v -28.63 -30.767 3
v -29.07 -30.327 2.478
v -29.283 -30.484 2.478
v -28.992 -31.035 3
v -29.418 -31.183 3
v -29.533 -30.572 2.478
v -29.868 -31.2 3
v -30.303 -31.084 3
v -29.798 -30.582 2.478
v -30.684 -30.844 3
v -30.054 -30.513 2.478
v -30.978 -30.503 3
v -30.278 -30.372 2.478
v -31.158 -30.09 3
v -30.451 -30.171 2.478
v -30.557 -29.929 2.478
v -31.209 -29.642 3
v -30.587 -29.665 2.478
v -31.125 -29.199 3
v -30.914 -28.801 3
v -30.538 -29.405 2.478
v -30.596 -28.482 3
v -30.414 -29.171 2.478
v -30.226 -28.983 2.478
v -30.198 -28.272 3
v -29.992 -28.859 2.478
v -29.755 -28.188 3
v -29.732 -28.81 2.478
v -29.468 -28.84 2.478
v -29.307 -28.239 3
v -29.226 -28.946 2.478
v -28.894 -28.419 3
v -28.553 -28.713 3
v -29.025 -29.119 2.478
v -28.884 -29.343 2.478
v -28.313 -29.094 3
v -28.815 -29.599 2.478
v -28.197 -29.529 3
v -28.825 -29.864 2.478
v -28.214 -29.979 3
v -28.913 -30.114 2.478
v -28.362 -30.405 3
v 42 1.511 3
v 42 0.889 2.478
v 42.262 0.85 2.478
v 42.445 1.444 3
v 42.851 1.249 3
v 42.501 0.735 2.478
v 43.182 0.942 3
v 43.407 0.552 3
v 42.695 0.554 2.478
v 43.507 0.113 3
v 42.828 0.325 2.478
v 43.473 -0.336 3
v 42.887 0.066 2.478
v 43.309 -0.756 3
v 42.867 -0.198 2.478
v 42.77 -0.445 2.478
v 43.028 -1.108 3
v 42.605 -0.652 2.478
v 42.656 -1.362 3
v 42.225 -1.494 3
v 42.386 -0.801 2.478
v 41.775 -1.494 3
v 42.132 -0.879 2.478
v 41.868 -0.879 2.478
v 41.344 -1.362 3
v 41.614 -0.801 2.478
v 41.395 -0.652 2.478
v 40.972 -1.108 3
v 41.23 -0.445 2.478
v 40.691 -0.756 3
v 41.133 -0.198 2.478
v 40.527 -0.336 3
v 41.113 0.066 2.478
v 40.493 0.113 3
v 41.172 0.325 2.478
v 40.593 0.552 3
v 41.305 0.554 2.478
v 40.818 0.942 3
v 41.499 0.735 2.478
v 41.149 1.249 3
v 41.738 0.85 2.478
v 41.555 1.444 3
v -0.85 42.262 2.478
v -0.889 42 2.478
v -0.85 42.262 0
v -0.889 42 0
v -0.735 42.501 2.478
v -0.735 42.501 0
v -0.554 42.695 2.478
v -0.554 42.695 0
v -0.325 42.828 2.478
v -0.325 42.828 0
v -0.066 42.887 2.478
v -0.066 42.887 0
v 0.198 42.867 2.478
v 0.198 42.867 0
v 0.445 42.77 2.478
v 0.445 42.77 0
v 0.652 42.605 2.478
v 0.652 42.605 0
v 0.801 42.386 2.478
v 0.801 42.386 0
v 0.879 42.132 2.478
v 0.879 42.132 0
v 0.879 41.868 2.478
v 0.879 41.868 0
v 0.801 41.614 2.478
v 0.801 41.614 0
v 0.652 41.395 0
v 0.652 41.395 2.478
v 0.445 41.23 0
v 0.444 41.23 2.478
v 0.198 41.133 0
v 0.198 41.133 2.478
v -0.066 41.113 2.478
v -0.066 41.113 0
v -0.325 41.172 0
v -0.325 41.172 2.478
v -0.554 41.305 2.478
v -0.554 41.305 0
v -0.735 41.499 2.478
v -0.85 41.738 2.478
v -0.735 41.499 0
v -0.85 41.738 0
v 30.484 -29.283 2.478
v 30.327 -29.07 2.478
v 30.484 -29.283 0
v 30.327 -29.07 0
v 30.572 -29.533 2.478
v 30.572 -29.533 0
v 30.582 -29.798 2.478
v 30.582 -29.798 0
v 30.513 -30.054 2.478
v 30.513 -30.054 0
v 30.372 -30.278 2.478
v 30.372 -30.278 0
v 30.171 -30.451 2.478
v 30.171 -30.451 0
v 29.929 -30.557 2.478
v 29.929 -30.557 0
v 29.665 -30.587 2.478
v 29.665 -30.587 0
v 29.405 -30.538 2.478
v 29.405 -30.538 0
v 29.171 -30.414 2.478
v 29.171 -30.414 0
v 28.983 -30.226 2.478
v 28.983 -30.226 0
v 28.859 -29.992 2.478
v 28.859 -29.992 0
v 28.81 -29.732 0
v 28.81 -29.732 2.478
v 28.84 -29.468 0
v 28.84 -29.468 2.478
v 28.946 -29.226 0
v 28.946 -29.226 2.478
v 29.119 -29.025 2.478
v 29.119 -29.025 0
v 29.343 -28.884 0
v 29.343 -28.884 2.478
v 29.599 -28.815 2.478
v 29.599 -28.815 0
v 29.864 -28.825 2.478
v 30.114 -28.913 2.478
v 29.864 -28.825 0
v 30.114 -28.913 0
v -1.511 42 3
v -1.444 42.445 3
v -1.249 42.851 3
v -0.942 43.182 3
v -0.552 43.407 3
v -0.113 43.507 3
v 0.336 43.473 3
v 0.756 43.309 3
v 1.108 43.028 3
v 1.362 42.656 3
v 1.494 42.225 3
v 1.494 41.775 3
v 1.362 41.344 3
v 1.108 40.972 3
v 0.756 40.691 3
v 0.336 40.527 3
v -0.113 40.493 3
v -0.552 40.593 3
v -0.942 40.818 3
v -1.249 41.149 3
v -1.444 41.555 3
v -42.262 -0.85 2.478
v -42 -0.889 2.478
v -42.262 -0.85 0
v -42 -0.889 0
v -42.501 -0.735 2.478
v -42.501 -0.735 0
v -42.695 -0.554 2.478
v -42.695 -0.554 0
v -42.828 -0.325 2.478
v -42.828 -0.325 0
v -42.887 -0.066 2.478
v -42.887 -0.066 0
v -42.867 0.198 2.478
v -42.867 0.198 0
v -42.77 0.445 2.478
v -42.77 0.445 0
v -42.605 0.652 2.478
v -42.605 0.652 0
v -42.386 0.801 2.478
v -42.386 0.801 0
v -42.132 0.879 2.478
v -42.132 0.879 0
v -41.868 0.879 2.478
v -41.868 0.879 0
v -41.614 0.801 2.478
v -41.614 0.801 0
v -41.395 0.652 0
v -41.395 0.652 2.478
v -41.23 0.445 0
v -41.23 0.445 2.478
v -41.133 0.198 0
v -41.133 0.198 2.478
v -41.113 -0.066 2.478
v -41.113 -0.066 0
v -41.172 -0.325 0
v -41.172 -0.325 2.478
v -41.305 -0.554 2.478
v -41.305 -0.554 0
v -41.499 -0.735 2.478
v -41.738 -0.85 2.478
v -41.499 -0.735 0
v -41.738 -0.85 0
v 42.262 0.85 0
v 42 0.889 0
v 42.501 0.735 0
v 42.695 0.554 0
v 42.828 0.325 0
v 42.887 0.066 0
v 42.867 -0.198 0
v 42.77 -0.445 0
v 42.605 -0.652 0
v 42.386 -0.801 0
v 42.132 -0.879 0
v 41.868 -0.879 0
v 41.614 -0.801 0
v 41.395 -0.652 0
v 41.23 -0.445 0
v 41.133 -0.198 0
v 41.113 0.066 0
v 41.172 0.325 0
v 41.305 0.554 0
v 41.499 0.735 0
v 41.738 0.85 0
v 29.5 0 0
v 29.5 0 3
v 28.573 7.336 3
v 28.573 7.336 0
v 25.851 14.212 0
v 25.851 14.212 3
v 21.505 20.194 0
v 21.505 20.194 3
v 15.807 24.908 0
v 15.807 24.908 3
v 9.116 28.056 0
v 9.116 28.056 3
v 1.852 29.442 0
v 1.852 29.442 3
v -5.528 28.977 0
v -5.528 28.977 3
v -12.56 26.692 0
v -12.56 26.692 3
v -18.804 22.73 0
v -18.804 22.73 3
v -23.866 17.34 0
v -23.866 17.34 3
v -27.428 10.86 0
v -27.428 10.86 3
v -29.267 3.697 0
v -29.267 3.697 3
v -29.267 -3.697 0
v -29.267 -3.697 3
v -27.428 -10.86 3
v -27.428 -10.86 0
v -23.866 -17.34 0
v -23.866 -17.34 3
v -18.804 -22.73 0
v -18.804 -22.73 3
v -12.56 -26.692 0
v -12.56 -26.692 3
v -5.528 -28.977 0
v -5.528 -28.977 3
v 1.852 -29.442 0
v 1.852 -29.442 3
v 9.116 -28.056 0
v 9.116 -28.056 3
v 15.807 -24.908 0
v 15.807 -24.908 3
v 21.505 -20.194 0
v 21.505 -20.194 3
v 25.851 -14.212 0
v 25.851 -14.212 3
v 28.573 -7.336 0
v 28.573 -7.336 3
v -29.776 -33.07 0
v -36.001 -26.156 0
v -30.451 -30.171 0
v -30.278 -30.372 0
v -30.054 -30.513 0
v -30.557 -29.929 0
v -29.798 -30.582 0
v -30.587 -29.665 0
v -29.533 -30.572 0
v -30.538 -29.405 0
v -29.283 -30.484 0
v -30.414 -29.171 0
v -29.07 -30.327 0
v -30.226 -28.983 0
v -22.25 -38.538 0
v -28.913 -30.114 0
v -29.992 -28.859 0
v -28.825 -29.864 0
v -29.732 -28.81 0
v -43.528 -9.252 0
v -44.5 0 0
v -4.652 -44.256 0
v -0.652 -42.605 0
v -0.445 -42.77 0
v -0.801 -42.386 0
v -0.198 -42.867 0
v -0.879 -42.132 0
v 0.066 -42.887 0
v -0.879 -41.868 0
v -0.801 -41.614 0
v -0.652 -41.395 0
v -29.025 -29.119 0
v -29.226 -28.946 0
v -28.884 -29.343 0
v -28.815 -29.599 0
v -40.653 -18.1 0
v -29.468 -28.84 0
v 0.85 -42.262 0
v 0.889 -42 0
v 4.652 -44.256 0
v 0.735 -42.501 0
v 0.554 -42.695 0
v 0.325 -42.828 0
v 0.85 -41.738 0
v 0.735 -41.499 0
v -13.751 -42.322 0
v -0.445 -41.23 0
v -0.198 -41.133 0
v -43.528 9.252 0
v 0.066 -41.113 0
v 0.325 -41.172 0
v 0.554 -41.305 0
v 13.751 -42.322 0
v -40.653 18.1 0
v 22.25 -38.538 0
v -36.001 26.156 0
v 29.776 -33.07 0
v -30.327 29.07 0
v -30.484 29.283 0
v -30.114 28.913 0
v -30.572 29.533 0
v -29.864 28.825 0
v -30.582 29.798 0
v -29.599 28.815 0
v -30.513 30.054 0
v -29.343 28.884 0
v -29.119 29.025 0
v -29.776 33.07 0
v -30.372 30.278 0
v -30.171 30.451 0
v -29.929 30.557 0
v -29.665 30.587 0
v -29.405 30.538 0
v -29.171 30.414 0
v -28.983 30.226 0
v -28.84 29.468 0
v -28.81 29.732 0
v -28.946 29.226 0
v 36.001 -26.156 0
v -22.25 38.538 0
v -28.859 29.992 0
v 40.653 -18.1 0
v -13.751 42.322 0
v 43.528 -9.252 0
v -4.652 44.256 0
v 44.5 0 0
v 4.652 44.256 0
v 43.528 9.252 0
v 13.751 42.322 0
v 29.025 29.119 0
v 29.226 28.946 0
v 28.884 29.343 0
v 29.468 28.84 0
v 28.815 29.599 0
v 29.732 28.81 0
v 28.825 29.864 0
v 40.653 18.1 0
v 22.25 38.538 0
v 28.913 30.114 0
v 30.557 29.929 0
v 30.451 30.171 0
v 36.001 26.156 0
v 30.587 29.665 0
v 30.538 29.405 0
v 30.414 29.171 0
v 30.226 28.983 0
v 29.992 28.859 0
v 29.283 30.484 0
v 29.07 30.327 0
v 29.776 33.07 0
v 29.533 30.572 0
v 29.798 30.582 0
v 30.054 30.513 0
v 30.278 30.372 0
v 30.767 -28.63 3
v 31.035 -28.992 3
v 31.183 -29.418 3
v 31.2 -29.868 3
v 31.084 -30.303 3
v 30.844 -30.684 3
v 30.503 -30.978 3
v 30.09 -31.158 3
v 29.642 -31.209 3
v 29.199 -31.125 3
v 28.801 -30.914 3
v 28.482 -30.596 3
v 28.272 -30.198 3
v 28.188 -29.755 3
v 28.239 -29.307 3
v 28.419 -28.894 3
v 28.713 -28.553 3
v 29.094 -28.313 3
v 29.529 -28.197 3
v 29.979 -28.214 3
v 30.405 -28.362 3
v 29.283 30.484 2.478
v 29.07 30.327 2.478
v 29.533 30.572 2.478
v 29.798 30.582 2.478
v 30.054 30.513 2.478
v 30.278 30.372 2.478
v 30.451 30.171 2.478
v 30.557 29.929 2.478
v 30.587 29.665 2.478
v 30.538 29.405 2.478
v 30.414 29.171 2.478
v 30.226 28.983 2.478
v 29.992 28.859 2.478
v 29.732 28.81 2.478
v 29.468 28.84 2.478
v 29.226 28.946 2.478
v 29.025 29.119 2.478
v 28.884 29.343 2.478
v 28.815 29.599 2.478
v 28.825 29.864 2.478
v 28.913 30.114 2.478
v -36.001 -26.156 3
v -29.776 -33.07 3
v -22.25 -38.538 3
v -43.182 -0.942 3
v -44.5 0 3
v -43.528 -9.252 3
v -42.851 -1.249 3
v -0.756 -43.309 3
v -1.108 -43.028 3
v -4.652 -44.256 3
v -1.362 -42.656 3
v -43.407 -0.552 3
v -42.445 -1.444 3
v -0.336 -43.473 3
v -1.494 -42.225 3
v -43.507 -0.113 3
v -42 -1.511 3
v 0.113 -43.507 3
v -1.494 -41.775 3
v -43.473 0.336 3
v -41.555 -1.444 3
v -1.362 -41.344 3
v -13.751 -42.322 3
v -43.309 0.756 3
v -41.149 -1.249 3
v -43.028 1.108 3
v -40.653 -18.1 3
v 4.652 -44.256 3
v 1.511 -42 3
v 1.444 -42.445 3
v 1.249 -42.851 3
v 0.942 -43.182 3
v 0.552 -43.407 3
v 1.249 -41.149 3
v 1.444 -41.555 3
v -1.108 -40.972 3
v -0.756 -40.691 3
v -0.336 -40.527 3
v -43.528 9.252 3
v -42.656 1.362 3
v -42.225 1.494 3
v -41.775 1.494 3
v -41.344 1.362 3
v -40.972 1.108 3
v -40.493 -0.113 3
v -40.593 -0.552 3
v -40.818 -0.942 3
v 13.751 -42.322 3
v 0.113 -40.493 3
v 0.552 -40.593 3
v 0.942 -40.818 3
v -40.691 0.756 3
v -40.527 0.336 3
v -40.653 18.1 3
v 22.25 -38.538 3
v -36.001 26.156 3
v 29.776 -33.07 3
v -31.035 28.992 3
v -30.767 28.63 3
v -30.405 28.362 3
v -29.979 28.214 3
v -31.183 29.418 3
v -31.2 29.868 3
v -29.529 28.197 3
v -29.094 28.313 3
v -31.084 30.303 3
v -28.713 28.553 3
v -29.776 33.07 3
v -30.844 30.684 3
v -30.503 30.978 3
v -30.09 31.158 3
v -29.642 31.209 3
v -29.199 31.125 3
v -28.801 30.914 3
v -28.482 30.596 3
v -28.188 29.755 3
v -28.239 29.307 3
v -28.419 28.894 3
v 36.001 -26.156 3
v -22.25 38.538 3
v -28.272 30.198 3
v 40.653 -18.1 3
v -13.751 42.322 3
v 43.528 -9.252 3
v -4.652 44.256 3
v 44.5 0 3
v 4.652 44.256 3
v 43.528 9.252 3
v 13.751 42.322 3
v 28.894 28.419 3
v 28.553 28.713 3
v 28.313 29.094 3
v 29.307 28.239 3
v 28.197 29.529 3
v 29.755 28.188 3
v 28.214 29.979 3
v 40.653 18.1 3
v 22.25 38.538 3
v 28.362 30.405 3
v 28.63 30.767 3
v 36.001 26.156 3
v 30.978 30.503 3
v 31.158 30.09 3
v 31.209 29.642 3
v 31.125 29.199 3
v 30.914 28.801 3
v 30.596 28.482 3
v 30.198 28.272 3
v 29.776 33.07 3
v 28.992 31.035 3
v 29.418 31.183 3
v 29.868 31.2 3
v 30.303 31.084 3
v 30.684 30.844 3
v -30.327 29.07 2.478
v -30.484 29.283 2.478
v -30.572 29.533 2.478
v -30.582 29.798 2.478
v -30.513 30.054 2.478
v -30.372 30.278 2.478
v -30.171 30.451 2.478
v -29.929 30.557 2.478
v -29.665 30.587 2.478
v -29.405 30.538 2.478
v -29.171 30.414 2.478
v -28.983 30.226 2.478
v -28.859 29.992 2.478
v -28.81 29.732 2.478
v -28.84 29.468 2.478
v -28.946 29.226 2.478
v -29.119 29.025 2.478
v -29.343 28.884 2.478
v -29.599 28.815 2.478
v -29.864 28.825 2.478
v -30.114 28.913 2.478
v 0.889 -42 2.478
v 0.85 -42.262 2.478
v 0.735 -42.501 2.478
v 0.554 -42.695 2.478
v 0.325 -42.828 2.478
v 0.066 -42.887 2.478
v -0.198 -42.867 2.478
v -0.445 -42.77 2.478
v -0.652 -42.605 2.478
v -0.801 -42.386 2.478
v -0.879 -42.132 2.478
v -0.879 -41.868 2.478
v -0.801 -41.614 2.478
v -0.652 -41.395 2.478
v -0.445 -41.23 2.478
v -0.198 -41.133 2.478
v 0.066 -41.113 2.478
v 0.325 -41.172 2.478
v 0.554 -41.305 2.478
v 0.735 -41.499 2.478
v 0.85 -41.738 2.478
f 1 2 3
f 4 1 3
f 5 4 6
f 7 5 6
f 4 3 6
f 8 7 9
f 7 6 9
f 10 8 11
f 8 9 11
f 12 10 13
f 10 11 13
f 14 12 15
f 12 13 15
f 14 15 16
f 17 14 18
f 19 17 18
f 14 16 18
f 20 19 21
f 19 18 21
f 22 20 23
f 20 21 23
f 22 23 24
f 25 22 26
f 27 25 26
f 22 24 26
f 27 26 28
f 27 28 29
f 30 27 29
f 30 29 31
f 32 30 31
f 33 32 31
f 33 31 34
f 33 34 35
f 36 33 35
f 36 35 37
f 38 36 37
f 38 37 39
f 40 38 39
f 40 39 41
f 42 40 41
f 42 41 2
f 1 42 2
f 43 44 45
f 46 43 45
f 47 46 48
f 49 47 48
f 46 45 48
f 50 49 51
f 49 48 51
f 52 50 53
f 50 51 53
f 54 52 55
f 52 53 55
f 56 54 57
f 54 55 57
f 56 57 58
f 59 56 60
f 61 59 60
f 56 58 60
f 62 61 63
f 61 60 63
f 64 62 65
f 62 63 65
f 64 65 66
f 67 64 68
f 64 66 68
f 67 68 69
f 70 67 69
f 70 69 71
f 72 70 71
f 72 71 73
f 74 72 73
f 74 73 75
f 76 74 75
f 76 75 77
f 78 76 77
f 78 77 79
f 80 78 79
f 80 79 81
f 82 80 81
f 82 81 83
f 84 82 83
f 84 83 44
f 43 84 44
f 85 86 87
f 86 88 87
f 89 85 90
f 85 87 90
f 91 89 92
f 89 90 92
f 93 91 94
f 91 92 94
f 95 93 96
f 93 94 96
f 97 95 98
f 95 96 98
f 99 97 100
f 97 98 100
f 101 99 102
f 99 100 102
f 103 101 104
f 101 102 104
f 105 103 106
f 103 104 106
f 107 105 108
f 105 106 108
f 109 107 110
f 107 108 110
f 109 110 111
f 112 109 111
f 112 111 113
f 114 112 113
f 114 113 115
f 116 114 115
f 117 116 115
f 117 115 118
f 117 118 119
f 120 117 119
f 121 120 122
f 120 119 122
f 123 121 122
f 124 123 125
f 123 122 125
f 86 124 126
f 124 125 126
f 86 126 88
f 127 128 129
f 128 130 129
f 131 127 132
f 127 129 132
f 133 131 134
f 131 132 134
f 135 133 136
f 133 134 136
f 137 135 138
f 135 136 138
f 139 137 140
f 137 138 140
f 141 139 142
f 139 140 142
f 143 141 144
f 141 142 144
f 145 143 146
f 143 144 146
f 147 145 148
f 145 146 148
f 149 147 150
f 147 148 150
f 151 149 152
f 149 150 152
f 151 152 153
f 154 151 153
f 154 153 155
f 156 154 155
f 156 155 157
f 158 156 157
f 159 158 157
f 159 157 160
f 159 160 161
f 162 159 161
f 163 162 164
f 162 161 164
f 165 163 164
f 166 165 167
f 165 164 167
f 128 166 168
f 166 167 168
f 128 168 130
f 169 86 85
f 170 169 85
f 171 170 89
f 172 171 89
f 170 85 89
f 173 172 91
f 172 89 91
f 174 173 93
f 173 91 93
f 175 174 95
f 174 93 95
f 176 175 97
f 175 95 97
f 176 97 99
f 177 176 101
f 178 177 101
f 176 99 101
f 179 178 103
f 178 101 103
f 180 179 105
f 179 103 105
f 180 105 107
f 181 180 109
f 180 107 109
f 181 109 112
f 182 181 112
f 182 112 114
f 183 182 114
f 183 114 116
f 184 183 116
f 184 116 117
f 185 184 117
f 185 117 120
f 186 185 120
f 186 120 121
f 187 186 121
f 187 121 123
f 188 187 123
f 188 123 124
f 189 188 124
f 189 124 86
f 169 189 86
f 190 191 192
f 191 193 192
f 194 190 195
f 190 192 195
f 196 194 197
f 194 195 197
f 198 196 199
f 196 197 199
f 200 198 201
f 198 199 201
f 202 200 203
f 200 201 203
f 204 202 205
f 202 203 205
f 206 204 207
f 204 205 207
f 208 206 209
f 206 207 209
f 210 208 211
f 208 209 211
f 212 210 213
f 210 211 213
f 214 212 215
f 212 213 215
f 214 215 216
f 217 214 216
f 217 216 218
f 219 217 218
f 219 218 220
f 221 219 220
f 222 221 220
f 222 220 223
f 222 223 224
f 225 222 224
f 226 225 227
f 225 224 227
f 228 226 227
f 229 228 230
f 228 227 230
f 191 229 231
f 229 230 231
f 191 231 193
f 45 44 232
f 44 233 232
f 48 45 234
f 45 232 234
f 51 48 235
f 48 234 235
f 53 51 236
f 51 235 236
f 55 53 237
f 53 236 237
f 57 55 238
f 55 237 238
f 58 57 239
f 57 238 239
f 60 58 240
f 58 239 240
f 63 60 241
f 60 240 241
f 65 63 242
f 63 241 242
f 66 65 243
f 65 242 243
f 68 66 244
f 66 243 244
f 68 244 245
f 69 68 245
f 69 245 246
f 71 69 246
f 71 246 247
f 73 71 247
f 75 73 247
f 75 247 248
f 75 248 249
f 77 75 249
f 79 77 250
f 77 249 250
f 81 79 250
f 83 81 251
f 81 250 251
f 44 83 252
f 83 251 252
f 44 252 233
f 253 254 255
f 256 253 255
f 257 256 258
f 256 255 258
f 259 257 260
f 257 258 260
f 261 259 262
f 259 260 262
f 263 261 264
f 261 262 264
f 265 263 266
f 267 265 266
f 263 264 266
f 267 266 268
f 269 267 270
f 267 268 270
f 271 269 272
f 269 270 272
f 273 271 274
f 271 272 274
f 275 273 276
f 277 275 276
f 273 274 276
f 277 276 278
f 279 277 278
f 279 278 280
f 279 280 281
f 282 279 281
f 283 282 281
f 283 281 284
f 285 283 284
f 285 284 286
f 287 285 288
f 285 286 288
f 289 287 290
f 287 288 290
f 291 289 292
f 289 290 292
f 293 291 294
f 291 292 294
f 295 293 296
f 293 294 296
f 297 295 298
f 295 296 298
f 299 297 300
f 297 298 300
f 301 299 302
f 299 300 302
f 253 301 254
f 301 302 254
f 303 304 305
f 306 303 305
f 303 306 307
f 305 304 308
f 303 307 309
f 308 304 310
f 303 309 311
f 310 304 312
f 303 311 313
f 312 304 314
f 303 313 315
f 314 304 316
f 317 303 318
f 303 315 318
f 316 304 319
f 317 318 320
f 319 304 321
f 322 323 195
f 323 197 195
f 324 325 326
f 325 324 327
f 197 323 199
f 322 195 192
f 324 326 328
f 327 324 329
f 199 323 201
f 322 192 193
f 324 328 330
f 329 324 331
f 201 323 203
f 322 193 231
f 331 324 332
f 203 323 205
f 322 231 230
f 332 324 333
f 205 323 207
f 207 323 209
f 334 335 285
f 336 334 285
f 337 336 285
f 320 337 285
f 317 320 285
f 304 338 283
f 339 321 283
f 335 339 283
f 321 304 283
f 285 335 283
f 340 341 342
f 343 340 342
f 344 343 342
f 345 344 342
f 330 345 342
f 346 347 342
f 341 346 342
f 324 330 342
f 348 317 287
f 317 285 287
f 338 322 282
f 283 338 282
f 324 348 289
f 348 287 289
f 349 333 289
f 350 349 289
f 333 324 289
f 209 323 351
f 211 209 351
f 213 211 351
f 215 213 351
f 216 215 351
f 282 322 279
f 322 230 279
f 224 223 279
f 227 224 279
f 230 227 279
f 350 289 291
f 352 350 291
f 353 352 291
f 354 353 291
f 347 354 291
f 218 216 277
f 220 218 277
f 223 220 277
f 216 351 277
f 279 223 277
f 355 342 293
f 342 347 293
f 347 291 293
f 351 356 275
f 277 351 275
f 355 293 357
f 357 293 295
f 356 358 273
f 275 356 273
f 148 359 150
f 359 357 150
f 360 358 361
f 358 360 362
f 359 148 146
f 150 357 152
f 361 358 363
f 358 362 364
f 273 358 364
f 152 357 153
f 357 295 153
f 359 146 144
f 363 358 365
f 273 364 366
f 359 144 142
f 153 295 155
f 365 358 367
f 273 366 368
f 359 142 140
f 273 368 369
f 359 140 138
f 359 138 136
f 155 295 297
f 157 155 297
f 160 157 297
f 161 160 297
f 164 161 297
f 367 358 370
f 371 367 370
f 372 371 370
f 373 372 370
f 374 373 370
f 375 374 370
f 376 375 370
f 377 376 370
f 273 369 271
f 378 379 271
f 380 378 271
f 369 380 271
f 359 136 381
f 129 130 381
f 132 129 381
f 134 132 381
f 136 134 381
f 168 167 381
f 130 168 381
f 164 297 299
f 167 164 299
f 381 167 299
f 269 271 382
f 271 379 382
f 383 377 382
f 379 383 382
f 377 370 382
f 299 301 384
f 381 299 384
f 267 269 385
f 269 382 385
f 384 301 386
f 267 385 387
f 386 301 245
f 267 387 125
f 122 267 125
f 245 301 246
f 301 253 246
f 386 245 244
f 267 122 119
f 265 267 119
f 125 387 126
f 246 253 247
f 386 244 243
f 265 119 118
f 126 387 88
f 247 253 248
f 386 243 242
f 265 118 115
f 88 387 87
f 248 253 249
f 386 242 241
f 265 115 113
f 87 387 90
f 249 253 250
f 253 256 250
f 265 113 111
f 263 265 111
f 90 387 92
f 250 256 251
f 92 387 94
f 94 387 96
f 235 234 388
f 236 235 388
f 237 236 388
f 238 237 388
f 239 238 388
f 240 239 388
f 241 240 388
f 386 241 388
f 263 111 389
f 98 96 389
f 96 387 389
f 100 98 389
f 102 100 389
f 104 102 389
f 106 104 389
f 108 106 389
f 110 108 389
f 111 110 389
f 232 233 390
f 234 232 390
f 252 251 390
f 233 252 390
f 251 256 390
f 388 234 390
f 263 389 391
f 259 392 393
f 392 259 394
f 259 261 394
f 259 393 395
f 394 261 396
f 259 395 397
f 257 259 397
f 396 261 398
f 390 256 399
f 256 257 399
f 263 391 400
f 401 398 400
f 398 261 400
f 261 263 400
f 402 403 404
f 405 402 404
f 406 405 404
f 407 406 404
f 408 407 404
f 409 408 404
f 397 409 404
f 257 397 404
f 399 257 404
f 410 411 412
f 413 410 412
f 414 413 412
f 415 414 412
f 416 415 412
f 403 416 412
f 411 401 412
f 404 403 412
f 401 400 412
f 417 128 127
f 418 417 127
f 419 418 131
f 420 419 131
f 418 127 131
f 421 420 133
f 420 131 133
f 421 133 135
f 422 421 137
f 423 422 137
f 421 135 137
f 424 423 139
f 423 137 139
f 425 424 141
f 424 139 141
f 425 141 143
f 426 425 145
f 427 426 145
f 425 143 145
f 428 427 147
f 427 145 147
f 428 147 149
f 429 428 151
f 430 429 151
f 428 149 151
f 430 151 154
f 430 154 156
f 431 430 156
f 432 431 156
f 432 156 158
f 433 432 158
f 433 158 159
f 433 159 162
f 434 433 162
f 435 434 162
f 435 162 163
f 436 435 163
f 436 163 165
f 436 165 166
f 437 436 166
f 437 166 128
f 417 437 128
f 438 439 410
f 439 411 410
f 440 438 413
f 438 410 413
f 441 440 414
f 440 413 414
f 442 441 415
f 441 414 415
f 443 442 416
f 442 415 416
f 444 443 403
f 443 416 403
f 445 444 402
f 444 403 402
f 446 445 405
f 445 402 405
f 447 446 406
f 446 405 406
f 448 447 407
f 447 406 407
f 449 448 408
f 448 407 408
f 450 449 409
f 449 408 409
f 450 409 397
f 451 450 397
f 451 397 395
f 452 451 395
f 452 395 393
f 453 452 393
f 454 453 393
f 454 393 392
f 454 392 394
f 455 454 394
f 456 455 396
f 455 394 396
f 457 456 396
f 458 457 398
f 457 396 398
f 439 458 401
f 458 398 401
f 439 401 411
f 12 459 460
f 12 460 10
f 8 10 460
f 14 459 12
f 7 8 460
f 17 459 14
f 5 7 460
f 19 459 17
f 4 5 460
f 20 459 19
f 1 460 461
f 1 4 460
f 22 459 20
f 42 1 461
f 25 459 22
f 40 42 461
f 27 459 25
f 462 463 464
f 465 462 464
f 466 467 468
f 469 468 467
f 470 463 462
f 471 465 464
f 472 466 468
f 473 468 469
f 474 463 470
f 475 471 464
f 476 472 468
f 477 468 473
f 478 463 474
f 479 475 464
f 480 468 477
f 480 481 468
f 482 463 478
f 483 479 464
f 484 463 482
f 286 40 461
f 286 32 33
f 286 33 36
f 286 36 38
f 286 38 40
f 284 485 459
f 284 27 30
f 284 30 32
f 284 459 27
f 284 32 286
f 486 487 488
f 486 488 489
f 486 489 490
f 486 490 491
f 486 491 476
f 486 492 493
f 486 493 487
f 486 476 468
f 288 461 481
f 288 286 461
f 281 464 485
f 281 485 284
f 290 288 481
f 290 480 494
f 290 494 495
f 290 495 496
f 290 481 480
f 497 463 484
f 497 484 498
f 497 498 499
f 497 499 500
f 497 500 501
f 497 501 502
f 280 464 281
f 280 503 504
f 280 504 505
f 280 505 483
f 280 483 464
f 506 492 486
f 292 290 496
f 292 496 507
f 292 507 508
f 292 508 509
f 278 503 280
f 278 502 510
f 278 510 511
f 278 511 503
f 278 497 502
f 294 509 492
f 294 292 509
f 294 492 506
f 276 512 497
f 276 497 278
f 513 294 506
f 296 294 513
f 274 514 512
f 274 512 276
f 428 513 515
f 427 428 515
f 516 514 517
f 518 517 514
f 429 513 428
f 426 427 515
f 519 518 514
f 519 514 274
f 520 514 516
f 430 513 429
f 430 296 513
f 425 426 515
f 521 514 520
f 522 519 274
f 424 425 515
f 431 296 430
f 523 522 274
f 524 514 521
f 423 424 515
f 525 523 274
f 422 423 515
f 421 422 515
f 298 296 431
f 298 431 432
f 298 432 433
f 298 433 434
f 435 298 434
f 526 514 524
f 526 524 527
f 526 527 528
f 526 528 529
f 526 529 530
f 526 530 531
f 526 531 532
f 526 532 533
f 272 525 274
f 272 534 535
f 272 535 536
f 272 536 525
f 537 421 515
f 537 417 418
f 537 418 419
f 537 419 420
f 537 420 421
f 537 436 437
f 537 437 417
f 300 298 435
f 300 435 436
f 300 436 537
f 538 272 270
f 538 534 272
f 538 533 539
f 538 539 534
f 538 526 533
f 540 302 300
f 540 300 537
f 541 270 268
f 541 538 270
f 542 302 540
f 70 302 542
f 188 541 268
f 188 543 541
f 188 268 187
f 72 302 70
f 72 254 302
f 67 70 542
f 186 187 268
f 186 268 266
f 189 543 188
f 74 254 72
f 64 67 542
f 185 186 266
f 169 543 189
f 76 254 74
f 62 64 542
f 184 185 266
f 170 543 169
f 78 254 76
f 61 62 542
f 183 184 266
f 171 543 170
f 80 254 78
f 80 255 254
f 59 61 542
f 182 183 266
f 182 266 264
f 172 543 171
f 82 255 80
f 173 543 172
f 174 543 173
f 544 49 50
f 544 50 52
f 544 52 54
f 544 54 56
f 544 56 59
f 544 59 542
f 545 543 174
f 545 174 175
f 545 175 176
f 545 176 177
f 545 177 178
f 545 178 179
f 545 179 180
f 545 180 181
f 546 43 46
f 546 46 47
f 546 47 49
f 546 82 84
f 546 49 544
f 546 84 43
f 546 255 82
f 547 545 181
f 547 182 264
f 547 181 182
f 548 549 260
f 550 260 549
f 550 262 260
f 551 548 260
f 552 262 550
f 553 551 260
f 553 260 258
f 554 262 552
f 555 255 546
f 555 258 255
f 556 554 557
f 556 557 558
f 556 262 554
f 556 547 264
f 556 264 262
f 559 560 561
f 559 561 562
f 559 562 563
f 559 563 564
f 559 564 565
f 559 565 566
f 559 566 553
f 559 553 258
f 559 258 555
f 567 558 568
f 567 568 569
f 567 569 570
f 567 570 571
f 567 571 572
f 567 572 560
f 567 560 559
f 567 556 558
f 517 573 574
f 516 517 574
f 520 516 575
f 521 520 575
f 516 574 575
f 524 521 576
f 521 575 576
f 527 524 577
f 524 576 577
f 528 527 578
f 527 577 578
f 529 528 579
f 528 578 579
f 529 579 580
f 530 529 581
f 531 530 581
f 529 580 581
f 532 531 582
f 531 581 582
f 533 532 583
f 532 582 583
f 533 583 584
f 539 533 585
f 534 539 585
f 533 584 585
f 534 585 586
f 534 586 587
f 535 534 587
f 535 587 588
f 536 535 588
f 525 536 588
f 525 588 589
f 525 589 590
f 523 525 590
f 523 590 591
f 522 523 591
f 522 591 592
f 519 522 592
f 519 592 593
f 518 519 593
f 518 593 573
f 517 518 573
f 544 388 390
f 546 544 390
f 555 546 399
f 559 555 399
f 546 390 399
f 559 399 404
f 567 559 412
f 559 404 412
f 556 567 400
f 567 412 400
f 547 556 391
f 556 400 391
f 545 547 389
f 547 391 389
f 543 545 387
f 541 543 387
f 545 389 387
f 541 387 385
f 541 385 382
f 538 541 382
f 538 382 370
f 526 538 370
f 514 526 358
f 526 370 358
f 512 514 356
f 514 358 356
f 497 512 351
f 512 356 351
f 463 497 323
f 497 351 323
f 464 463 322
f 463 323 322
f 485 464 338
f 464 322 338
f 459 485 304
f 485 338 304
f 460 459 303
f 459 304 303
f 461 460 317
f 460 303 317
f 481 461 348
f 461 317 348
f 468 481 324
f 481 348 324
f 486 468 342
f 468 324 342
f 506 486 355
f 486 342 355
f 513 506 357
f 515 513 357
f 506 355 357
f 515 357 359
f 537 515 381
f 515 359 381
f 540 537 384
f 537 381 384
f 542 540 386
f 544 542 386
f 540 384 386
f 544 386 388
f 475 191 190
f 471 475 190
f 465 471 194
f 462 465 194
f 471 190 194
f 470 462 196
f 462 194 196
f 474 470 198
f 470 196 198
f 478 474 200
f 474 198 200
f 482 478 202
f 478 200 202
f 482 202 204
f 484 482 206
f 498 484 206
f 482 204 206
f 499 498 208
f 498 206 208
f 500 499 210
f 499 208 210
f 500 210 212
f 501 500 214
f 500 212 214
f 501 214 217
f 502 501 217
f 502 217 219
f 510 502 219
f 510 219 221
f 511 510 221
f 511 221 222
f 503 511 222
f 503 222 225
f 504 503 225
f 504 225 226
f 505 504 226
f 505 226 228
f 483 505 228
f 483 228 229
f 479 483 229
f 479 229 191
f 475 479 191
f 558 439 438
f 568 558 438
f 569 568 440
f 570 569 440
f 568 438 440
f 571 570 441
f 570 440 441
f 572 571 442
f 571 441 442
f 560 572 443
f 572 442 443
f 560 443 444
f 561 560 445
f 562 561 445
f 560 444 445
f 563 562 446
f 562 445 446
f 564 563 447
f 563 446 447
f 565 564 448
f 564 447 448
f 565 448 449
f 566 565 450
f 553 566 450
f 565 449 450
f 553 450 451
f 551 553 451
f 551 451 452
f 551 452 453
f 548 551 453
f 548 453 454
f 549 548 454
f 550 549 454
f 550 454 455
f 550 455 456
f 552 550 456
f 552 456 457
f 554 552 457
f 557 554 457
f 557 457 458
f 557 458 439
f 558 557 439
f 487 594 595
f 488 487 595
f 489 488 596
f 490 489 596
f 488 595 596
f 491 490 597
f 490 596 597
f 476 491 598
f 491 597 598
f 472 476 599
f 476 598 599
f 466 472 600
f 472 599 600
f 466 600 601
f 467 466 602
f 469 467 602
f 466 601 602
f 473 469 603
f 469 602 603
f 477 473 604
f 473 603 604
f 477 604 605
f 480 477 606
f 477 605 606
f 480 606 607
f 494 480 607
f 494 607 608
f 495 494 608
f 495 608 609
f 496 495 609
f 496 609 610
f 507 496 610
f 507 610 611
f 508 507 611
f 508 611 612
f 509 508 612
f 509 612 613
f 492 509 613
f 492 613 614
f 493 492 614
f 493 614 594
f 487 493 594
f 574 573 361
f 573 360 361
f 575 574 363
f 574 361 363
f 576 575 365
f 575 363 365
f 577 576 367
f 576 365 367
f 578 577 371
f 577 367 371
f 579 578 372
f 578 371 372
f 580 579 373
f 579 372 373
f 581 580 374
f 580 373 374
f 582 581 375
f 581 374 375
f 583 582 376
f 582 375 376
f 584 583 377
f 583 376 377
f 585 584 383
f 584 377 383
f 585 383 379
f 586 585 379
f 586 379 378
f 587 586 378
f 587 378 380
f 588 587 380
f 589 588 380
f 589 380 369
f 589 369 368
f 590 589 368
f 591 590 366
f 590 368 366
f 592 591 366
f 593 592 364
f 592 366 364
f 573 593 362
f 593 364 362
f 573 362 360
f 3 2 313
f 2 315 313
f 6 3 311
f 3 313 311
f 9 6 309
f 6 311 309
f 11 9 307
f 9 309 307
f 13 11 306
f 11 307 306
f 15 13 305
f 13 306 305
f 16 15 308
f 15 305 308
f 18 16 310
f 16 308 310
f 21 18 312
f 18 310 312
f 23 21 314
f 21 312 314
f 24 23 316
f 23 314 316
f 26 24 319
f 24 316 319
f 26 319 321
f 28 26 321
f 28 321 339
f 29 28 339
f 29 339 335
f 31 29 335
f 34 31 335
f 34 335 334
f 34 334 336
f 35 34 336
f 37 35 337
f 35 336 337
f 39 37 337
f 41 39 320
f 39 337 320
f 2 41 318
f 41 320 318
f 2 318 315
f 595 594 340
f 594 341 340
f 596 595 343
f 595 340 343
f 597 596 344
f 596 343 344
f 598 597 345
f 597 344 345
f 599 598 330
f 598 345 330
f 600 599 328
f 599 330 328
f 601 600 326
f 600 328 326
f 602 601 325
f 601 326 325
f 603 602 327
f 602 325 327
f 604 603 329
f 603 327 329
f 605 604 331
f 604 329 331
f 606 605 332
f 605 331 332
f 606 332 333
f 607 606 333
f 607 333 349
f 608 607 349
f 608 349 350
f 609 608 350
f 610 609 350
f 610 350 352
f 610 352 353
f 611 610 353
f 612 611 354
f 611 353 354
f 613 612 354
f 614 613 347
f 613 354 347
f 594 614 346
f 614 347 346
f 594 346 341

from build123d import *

# Parameters (mm, degrees)
SKETCH1_R                                         = 44.5
BOSS_EXTRUDE1_DEPTH                               = 3
SKETCH2_R                                         = 29.5
CUT_EXTRUDE1_DEPTH                                = 3
CSK_FOR_0_FLAT_HEAD_MACHINE_SCREW_100_D           = 1.778
CSK_FOR_0_FLAT_HEAD_MACHINE_SCREW_100_CSINK_D     = 3.0226
CSK_FOR_0_FLAT_HEAD_MACHINE_SCREW_100_CSINK_ANGLE = 100
CIRPATTERN1_COUNT                                 = 8


with BuildPart() as part:
    # Sketch1 → Boss-Extrude1 (new body)
    with BuildSketch(Plane.XY):
        Circle(SKETCH1_R)
    extrude(amount=BOSS_EXTRUDE1_DEPTH)

    # Sketch2 → Cut-Extrude1 (cut)
    with BuildSketch(Plane.XY.offset(3)):
        Circle(SKETCH2_R)
    extrude(amount=-CUT_EXTRUDE1_DEPTH, mode=Mode.SUBTRACT)

    # CSK for #0 Flat Head Machine Screw (100)1 (through all)
    with Locations(Plane.XY.offset(3)):
        with Locations((0, 42)):
            csk_for_0_flat_head_machine_screw_100 = CounterSinkHole(CSK_FOR_0_FLAT_HEAD_MACHINE_SCREW_100_D / 2, CSK_FOR_0_FLAT_HEAD_MACHINE_SCREW_100_CSINK_D / 2, counter_sink_angle=CSK_FOR_0_FLAT_HEAD_MACHINE_SCREW_100_CSINK_ANGLE)

    # CirPattern1: CSK for #0 Flat Head Machine Screw (100)1 ×8 about axis
    cirpattern1_axis = Axis((0, 0, 0), (0, 0, 1))
    for i in range(1, CIRPATTERN1_COUNT):
        add(csk_for_0_flat_head_machine_screw_100.rotate(cirpattern1_axis, i * 360 / CIRPATTERN1_COUNT), mode=Mode.SUBTRACT)


solid = part.part
